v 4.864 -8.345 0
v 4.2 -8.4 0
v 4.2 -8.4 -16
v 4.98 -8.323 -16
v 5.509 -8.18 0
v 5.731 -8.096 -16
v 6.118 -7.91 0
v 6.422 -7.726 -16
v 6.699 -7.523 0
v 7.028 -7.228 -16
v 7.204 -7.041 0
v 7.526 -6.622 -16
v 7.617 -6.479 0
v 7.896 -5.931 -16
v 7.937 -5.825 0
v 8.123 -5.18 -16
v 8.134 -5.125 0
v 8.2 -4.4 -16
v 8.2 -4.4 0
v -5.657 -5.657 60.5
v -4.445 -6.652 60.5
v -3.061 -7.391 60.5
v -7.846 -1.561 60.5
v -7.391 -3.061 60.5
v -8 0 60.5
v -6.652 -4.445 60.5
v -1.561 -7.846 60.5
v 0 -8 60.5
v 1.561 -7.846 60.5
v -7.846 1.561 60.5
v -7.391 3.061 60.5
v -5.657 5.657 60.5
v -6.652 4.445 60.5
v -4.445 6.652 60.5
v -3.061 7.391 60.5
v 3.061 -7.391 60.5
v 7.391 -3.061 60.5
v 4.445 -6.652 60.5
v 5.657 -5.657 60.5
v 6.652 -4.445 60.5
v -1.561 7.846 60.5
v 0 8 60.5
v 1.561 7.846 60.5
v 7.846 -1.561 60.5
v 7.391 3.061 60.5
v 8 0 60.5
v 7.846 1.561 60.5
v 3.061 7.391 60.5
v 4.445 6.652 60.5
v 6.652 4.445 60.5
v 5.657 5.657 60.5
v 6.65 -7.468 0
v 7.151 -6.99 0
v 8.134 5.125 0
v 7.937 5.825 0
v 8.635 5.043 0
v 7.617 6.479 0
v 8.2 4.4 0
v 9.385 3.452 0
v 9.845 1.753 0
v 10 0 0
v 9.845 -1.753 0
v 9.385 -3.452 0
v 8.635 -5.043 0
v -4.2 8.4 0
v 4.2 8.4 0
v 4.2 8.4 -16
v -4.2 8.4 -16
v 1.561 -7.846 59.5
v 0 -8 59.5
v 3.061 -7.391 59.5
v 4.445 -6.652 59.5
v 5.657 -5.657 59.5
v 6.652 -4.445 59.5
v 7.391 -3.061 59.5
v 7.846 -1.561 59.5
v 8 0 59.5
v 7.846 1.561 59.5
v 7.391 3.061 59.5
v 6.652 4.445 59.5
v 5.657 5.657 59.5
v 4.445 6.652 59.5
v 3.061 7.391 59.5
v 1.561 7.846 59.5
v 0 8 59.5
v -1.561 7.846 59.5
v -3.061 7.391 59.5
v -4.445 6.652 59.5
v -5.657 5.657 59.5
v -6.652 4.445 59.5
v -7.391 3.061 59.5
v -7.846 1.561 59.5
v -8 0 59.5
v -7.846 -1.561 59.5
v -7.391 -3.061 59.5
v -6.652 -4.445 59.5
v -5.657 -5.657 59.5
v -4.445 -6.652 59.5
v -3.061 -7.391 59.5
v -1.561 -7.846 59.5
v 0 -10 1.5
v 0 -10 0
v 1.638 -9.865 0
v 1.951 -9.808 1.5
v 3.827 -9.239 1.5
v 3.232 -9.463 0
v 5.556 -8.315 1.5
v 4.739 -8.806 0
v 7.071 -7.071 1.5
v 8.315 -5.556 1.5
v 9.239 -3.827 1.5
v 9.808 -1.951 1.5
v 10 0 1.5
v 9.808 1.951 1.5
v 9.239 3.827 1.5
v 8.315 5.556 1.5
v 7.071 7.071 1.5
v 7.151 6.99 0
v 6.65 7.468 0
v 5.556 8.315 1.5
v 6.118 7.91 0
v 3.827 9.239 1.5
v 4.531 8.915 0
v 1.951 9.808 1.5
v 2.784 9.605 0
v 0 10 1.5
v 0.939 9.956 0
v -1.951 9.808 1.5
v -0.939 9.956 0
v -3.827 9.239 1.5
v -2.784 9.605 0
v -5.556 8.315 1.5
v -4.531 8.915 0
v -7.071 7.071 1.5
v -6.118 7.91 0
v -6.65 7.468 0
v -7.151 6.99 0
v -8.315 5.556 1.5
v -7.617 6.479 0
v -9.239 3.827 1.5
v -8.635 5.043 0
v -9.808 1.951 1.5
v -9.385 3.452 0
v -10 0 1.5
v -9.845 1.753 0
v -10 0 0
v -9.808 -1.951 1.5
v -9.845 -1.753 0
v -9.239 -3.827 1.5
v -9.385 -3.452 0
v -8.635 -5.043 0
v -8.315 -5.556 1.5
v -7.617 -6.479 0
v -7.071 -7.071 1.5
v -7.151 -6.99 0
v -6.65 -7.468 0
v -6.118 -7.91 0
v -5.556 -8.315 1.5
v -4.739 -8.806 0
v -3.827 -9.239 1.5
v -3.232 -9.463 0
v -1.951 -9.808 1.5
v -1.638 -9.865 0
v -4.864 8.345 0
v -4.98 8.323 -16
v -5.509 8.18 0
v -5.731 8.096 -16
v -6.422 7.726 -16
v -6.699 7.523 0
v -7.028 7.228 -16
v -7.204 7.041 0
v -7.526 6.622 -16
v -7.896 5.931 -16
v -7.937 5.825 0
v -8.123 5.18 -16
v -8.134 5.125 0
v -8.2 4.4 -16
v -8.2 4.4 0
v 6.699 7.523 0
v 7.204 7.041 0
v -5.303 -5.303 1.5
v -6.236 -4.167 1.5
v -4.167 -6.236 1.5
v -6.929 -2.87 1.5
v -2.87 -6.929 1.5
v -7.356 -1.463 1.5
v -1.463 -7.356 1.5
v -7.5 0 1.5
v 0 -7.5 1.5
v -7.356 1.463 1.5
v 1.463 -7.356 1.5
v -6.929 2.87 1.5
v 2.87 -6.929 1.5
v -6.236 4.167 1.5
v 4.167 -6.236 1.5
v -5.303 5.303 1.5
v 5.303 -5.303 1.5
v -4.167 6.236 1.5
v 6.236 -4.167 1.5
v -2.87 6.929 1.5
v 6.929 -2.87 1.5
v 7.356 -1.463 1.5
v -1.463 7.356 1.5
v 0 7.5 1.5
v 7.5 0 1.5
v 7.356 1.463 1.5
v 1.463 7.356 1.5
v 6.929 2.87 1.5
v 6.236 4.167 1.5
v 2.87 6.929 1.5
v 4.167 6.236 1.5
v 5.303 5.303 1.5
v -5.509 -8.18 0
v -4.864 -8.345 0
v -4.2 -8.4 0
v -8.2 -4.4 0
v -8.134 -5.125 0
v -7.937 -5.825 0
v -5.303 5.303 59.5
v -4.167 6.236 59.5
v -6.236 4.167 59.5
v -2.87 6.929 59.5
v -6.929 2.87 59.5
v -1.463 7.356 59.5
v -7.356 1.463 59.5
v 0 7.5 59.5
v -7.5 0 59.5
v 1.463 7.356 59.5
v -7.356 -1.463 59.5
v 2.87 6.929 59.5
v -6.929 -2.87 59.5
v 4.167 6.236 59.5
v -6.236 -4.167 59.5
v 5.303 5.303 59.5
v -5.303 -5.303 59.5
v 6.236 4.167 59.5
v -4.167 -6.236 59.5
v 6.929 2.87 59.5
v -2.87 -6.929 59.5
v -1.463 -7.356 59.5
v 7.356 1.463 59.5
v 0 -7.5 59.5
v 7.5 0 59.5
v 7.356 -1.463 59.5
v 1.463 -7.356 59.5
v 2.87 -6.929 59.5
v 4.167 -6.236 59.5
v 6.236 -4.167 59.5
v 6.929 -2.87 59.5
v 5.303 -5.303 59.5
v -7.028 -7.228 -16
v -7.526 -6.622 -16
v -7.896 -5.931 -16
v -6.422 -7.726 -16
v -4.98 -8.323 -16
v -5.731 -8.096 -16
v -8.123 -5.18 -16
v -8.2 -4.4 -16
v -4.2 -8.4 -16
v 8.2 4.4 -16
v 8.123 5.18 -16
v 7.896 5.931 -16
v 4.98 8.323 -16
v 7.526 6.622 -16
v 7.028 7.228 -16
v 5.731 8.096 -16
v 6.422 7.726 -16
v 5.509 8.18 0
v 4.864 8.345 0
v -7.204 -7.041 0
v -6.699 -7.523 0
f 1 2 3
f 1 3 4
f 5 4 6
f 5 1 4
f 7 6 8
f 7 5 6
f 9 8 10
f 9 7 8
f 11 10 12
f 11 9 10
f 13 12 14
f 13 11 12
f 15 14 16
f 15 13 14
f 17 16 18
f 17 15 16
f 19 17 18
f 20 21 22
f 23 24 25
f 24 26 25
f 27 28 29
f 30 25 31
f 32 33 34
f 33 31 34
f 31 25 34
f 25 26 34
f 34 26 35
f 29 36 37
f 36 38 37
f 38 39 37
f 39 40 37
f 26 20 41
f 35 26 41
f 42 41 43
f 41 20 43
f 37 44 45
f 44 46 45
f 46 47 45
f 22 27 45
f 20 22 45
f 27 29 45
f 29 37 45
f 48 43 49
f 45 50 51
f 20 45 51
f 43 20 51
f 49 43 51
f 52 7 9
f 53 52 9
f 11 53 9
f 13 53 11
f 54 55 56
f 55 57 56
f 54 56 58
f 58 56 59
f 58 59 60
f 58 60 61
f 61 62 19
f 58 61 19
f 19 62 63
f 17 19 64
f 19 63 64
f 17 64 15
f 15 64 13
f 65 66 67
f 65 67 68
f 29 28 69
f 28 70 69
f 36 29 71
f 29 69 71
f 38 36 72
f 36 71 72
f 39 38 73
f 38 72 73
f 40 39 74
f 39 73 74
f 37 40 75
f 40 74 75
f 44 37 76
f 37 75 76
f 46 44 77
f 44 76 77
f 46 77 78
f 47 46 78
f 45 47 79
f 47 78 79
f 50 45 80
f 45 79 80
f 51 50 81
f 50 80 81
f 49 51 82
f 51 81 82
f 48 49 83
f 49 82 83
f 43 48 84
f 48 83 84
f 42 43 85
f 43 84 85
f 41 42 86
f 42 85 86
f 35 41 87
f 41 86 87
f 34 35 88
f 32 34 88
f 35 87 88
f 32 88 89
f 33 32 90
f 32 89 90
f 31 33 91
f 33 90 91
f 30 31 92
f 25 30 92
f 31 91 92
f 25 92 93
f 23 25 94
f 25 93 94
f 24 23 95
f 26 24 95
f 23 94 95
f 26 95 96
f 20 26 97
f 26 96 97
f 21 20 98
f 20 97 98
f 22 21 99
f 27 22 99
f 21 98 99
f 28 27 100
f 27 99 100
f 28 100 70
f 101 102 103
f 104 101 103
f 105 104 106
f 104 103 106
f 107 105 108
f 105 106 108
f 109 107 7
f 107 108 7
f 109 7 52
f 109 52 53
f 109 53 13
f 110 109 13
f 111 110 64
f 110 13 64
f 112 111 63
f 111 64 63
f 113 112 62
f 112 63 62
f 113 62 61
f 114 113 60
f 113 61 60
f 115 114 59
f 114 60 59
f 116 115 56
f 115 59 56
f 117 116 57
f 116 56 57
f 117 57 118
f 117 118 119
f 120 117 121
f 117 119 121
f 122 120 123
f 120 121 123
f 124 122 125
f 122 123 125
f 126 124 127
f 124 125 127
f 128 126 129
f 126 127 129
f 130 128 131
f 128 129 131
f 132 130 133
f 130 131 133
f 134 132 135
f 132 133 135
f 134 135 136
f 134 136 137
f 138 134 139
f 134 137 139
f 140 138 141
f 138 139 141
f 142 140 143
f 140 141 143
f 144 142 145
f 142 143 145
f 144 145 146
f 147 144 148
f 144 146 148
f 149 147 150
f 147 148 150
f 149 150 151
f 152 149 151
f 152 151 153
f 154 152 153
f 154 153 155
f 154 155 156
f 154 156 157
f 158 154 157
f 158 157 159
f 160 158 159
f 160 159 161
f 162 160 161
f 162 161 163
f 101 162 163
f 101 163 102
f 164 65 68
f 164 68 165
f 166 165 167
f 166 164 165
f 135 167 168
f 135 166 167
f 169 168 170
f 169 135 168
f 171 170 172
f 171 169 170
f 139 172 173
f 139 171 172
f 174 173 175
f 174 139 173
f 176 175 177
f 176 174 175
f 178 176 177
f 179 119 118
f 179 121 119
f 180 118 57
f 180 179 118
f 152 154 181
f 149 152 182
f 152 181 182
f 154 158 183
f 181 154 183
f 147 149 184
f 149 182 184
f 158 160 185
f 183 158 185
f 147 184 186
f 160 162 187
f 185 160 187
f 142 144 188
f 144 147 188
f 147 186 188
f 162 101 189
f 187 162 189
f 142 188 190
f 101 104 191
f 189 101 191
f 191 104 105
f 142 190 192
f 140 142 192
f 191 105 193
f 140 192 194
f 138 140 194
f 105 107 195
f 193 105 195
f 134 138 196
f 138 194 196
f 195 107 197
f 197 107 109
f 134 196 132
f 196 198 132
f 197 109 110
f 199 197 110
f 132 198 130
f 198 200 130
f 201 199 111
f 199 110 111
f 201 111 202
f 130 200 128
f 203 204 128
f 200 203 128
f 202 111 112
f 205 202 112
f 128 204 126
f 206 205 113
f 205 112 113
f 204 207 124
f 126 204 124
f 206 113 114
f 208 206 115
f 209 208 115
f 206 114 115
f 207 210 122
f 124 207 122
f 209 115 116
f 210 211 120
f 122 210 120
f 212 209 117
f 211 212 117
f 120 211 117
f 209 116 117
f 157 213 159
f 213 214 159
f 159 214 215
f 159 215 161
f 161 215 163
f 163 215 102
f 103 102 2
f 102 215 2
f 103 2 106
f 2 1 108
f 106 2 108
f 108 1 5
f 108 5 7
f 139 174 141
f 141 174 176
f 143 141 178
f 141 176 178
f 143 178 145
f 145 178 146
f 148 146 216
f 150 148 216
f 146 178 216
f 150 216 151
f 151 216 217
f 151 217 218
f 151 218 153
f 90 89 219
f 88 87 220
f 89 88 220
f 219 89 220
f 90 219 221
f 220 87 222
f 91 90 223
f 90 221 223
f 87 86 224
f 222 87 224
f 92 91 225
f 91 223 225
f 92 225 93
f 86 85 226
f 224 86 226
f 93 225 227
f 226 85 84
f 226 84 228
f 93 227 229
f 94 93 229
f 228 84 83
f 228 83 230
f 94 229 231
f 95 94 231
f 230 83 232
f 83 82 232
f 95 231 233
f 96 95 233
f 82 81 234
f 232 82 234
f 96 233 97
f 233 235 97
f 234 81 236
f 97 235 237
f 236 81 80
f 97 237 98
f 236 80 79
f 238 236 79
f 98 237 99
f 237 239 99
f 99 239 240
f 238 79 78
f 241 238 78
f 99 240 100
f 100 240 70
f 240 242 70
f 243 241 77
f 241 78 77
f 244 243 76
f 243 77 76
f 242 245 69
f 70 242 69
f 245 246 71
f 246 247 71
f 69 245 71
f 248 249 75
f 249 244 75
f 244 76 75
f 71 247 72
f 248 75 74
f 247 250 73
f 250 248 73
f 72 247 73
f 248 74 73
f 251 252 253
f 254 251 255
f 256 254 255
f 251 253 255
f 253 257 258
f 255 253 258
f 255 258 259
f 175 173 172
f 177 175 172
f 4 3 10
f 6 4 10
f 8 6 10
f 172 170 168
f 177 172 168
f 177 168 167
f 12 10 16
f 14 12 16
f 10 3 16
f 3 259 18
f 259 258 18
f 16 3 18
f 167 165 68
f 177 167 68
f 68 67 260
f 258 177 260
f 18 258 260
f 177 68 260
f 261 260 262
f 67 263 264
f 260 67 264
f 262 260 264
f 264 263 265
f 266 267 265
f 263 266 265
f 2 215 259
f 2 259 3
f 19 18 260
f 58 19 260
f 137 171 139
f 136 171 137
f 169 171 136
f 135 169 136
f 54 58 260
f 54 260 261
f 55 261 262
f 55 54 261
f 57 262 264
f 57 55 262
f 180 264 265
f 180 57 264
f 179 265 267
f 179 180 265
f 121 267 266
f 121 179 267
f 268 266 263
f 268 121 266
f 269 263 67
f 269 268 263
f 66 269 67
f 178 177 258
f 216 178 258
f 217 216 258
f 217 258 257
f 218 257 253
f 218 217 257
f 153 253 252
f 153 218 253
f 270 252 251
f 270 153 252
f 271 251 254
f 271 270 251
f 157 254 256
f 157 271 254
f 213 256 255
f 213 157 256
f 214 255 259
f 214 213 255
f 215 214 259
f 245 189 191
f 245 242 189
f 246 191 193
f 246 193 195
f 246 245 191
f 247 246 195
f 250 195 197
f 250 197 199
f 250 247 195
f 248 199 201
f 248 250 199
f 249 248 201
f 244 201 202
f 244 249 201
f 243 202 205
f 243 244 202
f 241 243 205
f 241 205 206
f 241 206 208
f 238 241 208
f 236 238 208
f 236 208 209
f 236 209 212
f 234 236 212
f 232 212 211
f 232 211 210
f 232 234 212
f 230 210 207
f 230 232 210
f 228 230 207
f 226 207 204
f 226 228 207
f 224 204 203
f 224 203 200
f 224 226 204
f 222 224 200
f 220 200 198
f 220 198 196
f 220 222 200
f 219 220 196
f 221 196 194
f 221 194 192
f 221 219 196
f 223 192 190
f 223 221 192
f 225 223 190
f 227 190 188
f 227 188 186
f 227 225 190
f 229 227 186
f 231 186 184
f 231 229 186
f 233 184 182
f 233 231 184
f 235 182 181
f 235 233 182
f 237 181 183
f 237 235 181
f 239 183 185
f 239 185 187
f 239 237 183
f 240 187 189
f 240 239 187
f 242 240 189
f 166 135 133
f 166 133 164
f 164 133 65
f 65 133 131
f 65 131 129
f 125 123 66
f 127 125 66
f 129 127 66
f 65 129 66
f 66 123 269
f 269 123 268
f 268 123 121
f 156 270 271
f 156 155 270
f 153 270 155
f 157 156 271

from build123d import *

# Parameters (mm, degrees)
F1_DEPTH = 16
F2_W     = 7.5
F2_H     = 58


with BuildPart() as f1:
    # F0 (on Top) → F1 (new body)
    with BuildSketch(Plane.XY):
        with BuildLine():
            Line((-4.2, -8.4), (4.2, -8.4))
            ThreePointArc((4.2, -8.4), (7.028427, -7.228427), (8.2, -4.4))
            Line((8.2, -4.4), (8.2, 4.4))
            ThreePointArc((8.2, 4.4), (7.028427, 7.228427), (4.2, 8.4))
            Line((4.2, 8.4), (-4.2, 8.4))
            ThreePointArc((-4.2, 8.4), (-7.028427, 7.228427), (-8.2, 4.4))
            Line((-8.2, 4.4), (-8.2, -4.4))
            ThreePointArc((-8.2, -4.4), (-7.028427, -7.228427), (-4.2, -8.4))
        make_face()
    extrude(amount=-F1_DEPTH)

    # F2 (on Right) → F3 (revolve)
    with BuildSketch(Plane.YZ):
        Polygon((-10, 0), (0, 0), (0, 1.5), (-7.5, 1.5), (-10, 1.5), align=None)
        with Locations((-3.75, 30.5)):
            Rectangle(F2_W, F2_H)
        Polygon((-7.5, 59.5), (0, 59.5), (0, 60.5), (-8, 60.5), (-8, 59.5), align=None)
    revolve(axis=Axis((0, 0, 30.5), (0, 0, 1)))


solid = f1.part
